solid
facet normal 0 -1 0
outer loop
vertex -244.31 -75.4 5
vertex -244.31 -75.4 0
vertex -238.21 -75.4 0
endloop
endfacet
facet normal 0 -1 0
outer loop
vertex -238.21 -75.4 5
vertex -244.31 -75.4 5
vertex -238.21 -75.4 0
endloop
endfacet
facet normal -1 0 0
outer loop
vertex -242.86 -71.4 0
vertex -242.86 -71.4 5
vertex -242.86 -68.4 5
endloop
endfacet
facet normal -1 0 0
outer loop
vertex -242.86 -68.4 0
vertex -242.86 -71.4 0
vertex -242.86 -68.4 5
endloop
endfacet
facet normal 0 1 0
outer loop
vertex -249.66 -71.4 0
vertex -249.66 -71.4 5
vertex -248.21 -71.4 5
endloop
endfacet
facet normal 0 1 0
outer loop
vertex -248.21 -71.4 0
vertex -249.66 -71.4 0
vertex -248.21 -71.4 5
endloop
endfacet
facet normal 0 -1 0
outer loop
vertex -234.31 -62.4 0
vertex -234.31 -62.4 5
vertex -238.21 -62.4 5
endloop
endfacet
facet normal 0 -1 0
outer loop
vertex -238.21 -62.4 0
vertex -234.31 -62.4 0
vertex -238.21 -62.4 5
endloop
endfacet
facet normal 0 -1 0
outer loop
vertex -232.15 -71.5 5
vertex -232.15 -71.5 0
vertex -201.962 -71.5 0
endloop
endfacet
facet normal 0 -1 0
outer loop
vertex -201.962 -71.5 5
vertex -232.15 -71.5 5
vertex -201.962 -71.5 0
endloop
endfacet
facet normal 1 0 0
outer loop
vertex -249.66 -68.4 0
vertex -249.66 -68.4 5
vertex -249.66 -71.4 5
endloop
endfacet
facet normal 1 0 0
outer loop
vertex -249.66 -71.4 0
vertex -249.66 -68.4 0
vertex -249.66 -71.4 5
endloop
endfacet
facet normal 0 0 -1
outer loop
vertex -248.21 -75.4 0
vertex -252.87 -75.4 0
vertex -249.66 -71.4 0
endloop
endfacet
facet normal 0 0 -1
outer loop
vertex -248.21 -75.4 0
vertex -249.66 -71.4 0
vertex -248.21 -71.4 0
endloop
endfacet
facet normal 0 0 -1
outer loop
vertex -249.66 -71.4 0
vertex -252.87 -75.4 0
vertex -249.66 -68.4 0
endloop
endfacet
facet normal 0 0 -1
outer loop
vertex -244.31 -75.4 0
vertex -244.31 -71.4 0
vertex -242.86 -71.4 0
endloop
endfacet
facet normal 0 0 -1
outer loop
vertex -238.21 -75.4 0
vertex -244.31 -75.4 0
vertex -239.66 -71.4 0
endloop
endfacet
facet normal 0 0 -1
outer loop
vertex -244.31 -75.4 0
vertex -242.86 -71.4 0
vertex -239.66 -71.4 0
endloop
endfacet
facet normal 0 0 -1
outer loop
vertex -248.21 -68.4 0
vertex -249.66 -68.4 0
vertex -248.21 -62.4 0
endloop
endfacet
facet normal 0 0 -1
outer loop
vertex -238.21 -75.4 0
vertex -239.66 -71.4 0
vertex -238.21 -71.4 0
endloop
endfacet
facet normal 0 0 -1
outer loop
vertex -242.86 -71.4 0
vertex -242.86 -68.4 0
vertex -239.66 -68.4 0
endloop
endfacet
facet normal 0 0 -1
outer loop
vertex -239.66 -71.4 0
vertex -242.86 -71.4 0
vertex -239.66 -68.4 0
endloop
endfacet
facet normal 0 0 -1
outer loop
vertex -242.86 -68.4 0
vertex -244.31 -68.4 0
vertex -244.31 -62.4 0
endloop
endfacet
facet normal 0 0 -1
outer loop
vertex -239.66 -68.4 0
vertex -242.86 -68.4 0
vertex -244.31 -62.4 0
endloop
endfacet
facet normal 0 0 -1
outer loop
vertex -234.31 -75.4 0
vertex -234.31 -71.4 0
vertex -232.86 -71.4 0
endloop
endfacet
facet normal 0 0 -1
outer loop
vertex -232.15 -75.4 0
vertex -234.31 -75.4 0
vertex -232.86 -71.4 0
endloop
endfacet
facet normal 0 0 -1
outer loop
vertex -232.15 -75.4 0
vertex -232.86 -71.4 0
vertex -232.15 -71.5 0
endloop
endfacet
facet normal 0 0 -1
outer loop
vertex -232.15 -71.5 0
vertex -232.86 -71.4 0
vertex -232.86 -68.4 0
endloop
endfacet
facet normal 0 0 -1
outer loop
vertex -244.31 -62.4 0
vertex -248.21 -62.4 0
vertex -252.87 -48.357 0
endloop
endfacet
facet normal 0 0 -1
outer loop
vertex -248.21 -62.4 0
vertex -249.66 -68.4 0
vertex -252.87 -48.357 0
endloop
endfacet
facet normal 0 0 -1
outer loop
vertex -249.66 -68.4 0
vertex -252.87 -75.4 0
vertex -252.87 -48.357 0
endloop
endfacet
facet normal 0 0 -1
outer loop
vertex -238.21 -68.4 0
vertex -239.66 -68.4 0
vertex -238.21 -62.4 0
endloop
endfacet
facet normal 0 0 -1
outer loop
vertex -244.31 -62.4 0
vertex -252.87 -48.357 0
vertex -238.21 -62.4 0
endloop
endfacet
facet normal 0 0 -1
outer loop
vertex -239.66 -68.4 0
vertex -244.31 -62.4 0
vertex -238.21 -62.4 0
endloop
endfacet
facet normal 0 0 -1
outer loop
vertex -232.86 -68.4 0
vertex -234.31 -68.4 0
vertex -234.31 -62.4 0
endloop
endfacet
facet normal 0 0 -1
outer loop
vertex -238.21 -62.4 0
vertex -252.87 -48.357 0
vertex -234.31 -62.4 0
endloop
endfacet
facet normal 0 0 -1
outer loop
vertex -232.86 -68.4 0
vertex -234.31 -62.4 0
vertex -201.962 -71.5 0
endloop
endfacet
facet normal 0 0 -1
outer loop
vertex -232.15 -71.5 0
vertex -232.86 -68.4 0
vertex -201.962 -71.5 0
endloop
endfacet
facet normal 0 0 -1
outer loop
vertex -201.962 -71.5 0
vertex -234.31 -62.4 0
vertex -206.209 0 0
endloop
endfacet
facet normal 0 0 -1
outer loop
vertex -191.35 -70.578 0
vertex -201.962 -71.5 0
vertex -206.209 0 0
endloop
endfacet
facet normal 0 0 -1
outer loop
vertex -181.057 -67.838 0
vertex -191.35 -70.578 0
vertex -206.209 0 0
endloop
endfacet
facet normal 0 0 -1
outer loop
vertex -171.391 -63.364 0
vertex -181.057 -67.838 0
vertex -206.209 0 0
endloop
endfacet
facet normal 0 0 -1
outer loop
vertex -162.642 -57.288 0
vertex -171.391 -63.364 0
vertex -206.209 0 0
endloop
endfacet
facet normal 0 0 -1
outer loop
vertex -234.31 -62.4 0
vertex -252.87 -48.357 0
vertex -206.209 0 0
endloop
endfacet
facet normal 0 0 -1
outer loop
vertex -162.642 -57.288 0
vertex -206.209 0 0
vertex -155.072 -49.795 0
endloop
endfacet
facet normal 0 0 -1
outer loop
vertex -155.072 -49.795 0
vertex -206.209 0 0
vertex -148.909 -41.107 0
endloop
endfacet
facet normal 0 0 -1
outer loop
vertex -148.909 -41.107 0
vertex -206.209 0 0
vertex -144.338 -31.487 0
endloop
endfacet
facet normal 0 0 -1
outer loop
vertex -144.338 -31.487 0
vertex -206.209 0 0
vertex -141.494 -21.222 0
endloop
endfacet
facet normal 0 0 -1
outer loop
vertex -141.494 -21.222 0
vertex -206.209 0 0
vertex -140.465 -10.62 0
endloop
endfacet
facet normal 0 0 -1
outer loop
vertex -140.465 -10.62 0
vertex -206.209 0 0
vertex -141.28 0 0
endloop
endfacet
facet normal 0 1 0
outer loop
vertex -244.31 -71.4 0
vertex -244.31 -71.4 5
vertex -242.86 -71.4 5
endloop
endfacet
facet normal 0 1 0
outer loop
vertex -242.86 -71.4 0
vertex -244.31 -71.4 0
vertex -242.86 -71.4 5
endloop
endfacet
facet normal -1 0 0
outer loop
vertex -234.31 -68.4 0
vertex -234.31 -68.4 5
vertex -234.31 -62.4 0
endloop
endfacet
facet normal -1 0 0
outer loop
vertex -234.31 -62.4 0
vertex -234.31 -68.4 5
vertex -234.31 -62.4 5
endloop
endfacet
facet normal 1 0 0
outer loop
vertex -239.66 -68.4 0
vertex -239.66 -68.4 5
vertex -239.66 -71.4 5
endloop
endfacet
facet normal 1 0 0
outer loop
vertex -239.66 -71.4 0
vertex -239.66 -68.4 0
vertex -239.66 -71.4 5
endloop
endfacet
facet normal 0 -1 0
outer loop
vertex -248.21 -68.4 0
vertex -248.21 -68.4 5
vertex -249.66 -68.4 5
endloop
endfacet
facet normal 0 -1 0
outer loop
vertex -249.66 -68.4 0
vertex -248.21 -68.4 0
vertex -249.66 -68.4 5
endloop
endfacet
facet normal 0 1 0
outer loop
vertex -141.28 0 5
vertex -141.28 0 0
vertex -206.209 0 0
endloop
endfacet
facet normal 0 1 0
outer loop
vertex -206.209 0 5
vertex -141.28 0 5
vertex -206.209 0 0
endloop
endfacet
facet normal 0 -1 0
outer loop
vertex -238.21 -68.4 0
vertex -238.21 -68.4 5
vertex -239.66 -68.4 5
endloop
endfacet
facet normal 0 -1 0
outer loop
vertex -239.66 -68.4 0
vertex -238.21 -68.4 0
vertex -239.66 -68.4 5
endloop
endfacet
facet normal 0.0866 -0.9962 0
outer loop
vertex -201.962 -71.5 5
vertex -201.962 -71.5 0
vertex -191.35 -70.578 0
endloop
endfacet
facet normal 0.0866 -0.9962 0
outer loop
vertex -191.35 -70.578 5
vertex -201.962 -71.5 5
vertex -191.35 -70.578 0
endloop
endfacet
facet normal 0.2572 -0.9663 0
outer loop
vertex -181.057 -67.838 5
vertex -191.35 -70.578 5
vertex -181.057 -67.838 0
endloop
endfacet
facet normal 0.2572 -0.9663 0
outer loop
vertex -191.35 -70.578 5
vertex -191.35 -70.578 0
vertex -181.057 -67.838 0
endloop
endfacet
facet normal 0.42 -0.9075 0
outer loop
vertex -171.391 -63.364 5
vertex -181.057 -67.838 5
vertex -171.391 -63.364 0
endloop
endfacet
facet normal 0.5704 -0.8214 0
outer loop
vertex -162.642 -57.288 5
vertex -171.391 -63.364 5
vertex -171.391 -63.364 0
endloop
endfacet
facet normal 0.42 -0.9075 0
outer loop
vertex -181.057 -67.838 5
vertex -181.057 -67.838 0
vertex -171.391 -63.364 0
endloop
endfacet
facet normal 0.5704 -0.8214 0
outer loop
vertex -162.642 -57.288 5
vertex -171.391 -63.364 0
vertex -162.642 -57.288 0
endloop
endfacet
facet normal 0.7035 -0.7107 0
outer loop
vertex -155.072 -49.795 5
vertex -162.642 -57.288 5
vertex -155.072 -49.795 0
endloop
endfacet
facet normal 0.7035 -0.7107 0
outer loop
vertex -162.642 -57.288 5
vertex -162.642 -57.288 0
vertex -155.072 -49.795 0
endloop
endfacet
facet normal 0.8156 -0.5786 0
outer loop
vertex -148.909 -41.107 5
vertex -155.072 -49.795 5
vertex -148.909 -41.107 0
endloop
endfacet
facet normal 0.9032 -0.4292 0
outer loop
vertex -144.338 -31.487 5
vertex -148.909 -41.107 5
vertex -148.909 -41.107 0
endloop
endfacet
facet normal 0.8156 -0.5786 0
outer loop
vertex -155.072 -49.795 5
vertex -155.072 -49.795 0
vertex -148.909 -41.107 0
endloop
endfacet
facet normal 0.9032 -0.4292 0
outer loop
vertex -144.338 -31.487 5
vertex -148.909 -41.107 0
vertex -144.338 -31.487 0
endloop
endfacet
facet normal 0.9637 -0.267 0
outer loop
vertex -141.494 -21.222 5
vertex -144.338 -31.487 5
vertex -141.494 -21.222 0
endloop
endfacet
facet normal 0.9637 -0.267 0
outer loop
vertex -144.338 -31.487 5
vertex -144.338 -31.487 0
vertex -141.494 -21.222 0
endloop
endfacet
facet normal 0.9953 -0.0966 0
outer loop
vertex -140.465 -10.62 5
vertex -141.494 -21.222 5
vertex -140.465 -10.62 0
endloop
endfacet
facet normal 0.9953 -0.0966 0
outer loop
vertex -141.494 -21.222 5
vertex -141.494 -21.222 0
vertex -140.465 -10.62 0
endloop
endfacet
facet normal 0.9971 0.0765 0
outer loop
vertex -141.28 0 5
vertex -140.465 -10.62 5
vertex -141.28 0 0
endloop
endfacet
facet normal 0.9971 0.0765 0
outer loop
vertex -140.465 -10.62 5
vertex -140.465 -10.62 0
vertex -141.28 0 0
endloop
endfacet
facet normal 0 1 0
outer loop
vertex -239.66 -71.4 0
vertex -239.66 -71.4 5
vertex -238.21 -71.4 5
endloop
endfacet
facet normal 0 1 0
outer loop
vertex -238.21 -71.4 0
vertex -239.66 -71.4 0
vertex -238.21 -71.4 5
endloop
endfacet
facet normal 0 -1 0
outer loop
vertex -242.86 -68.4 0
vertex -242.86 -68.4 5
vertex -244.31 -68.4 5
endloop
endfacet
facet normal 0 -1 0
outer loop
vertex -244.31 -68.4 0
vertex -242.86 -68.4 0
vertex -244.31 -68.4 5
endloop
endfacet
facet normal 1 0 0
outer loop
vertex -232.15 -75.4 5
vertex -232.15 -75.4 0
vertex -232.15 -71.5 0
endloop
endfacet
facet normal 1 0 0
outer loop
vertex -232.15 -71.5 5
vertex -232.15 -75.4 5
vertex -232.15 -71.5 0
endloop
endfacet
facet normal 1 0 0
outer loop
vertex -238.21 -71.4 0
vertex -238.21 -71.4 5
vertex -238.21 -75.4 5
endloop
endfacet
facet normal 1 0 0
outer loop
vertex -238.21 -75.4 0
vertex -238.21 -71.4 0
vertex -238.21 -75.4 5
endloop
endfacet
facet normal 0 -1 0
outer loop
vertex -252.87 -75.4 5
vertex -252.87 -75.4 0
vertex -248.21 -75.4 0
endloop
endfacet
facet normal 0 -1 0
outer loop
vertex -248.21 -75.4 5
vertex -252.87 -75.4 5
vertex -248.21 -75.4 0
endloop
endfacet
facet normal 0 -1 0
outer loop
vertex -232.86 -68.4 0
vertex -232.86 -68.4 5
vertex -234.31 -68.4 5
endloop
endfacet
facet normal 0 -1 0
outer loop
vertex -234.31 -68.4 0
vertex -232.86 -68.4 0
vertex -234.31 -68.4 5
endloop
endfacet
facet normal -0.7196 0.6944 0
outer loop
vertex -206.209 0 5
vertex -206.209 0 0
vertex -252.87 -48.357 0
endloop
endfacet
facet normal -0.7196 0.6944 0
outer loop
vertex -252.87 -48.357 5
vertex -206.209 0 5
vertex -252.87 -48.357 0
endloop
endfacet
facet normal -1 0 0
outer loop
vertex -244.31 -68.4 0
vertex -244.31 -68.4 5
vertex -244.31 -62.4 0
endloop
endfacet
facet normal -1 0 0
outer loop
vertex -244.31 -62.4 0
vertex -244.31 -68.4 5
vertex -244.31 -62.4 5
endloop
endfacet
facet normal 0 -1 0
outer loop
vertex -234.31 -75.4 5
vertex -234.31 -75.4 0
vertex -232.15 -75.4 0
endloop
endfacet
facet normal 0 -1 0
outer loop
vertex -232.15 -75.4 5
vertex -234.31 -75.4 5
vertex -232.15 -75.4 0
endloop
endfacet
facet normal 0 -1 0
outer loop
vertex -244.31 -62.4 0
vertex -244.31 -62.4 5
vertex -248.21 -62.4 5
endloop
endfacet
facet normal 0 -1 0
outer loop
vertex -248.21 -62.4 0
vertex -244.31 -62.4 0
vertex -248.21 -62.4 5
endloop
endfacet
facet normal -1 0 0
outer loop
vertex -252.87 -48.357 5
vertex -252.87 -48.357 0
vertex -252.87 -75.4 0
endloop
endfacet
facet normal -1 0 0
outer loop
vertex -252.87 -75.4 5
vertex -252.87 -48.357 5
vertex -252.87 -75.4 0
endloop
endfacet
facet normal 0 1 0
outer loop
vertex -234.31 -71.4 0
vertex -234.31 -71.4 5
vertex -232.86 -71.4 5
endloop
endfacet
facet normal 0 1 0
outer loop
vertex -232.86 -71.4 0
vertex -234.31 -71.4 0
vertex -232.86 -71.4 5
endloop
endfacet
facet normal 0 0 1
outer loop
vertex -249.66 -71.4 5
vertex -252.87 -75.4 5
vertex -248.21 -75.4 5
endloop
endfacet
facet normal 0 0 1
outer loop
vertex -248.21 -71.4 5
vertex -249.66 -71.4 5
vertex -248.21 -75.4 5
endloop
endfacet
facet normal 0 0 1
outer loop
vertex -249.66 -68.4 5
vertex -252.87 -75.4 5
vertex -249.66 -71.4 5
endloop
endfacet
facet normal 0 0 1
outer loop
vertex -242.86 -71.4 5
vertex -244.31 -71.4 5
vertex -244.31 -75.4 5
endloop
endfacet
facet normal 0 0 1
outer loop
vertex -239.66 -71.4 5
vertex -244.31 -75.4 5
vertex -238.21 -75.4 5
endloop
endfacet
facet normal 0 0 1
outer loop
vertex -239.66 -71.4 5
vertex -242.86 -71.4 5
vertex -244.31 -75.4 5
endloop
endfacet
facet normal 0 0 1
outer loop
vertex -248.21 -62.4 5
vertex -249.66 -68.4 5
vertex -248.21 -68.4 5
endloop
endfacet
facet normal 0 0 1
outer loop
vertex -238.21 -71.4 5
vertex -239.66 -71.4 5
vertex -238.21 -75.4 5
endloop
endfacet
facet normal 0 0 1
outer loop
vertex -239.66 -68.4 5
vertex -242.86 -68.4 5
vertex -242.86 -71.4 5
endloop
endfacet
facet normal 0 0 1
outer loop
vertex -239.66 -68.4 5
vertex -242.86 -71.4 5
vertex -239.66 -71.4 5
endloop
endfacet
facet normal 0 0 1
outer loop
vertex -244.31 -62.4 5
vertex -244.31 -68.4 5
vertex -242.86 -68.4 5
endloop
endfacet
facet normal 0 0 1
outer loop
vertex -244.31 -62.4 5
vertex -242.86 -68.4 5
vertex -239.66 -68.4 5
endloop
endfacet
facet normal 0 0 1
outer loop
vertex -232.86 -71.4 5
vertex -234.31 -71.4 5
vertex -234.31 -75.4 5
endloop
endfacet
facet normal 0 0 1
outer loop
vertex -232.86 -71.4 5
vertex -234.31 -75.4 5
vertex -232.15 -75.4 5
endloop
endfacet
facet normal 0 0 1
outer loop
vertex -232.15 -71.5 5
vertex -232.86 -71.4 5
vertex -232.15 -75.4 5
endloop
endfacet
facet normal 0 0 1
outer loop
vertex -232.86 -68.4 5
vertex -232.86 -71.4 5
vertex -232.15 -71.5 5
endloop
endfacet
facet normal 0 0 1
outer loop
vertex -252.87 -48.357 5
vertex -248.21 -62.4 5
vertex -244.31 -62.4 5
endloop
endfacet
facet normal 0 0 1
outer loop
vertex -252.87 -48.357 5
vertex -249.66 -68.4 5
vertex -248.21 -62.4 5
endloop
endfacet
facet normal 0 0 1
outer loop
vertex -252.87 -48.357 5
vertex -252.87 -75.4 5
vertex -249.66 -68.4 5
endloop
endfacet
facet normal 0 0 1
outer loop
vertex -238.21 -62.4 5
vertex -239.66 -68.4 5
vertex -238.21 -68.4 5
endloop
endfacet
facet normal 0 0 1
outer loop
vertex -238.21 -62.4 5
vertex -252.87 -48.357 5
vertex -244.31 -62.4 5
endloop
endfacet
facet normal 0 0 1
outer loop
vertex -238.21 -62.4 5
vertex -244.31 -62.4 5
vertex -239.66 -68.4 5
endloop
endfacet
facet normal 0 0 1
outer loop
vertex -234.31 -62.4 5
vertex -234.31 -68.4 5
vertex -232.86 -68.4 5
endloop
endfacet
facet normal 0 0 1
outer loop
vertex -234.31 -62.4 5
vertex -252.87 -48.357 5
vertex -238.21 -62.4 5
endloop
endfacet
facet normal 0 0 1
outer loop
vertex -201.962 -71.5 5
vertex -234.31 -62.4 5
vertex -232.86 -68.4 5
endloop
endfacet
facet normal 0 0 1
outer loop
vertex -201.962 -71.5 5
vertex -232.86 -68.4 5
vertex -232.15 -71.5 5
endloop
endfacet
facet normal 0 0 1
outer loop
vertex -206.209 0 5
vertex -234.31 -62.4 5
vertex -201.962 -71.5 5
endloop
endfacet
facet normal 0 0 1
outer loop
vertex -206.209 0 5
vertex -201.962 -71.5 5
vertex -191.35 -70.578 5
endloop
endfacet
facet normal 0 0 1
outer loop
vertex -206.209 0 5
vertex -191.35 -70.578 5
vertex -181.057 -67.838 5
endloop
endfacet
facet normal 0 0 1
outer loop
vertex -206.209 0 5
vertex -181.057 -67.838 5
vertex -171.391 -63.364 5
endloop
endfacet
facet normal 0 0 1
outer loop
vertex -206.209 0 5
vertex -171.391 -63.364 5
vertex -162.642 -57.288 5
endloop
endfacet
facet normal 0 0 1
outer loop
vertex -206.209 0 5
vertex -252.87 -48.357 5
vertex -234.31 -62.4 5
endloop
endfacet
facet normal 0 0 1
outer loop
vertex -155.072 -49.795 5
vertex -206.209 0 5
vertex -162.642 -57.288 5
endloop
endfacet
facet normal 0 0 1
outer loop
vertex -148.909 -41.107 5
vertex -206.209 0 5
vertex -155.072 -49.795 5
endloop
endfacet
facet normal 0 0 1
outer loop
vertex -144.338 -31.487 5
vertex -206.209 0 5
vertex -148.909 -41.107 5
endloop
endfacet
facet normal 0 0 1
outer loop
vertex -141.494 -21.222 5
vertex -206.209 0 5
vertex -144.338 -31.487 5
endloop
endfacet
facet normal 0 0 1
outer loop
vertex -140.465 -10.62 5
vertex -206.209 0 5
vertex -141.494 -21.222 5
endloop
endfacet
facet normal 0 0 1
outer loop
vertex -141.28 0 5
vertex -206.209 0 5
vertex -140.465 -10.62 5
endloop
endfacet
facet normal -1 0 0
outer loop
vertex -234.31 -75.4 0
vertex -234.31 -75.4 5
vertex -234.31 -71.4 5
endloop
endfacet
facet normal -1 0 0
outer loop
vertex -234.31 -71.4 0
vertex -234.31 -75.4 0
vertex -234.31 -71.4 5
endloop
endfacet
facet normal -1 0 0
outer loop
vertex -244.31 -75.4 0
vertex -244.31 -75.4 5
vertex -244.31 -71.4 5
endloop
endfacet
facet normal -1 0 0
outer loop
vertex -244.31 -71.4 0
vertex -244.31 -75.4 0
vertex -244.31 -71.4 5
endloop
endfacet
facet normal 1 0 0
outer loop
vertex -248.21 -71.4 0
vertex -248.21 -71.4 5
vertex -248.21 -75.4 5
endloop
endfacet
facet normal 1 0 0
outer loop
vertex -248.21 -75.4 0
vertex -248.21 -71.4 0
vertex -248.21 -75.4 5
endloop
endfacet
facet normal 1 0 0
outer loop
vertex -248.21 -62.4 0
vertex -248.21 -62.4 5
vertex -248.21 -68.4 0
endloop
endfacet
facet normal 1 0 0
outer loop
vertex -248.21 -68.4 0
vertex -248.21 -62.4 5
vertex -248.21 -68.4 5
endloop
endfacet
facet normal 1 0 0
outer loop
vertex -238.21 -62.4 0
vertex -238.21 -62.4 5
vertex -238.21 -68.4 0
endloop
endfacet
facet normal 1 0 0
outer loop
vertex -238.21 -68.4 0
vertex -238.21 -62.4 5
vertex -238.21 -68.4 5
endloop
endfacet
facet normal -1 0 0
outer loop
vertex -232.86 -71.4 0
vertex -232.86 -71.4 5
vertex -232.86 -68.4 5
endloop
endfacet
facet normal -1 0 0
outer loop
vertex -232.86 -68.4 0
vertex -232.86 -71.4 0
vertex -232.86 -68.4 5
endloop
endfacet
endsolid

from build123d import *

# Parameters (mm, degrees)
BOSS_EXTRUDE1_DEPTH = 5
CUT_EXTRUDE1_DEPTH  = 5


with BuildPart() as part:
    # Sketch2 → Boss-Extrude1 (new body)
    with BuildSketch(Plane.XY):
        with BuildLine():
            Line((-252.87, -75.4), (-232.15, -75.4))
            Line((-232.15, -75.4), (-232.15, -71.5))
            Line((-232.15, -71.5), (-201.961827551, -71.5))
            ThreePointArc((-201.961827551, -71.5), (-155.072329793, -49.794786091), (-141.280281757, 0))
            Line((-141.280281757, 0), (-206.208901909, 0))
            Line((-206.208901909, 0), (-252.87, -48.35711287))
            Line((-252.87, -48.35711287), (-252.87, -75.4))
        make_face()
    extrude(amount=BOSS_EXTRUDE1_DEPTH)

    # Sketch3 → Cut-Extrude1 (cut)
    with BuildSketch(Plane.XY.offset(5)):
        Polygon((-248.21, -75.4), (-244.31, -75.4), (-244.31, -71.4), (-242.86, -71.4), (-242.86, -68.4), (-244.31, -68.4), (-244.31, -62.4), (-248.21, -62.4), (-248.21, -68.4), (-249.66, -68.4), (-249.66, -71.4), (-248.21, -71.4), align=None)
        Polygon((-238.21, -75.4), (-234.31, -75.4), (-234.31, -71.4), (-232.86, -71.4), (-232.86, -68.4), (-234.31, -68.4), (-234.31, -62.4), (-238.21, -62.4), (-238.21, -68.4), (-239.66, -68.4), (-239.66, -71.4), (-238.21, -71.4), align=None)
    extrude(amount=-CUT_EXTRUDE1_DEPTH, mode=Mode.SUBTRACT)


solid = part.part
